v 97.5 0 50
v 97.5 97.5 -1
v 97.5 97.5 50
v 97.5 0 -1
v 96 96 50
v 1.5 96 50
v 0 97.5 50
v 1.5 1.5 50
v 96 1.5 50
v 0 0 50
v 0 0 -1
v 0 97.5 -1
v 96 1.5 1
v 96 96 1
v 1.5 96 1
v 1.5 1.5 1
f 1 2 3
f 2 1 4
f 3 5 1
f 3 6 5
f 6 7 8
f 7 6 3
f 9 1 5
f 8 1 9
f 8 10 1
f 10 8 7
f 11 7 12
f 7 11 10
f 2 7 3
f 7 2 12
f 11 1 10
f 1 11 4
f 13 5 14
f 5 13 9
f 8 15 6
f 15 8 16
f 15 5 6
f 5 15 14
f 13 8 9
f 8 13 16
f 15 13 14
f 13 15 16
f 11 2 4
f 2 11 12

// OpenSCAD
BoxTopLength=197;
BoxTopWidth=197;
BoxHeight=190;
LipHeight=4;
LipThickness=2;
LipOverHangWidth=25;
BoxTopThickness=2;
BoxThickness=2;
IsOpenTop=true;



//meshX=26;
meshY=18;
meshZ=40;
Seedrows=4;
Seedcolumns=4;

spokeCount=24;
spokerows=8;
spokeDia=15;
spokeY=2;
wallWidth=2;


module Box(x,y,wall, height)
{
    b_floor = 2;
    //resize([0,0,0]) 
    translate([x/2,y/2,0]) 
    cube([x,y,b_floor],true); //box floor
    difference()
    {
    BoxWalls(x,y,wall,height);
//    color("blue") translate([-5,y/2,height-(meshZ/2)])
//    rotate(a=180, v=[1,0,1]) cylinder(20,5,5, false);
    }
    
}

module BoxWalls(x,y,wall, height)
{
     translate([x/2,y/2,height/2]) difference()
    {
    cube([x,y,height],true);
    cube([x-wall,y-wall,height+1], true);
    }
}

module drawTray()
{

Box(97.5,97.5,3,50);
}

drawTray();
